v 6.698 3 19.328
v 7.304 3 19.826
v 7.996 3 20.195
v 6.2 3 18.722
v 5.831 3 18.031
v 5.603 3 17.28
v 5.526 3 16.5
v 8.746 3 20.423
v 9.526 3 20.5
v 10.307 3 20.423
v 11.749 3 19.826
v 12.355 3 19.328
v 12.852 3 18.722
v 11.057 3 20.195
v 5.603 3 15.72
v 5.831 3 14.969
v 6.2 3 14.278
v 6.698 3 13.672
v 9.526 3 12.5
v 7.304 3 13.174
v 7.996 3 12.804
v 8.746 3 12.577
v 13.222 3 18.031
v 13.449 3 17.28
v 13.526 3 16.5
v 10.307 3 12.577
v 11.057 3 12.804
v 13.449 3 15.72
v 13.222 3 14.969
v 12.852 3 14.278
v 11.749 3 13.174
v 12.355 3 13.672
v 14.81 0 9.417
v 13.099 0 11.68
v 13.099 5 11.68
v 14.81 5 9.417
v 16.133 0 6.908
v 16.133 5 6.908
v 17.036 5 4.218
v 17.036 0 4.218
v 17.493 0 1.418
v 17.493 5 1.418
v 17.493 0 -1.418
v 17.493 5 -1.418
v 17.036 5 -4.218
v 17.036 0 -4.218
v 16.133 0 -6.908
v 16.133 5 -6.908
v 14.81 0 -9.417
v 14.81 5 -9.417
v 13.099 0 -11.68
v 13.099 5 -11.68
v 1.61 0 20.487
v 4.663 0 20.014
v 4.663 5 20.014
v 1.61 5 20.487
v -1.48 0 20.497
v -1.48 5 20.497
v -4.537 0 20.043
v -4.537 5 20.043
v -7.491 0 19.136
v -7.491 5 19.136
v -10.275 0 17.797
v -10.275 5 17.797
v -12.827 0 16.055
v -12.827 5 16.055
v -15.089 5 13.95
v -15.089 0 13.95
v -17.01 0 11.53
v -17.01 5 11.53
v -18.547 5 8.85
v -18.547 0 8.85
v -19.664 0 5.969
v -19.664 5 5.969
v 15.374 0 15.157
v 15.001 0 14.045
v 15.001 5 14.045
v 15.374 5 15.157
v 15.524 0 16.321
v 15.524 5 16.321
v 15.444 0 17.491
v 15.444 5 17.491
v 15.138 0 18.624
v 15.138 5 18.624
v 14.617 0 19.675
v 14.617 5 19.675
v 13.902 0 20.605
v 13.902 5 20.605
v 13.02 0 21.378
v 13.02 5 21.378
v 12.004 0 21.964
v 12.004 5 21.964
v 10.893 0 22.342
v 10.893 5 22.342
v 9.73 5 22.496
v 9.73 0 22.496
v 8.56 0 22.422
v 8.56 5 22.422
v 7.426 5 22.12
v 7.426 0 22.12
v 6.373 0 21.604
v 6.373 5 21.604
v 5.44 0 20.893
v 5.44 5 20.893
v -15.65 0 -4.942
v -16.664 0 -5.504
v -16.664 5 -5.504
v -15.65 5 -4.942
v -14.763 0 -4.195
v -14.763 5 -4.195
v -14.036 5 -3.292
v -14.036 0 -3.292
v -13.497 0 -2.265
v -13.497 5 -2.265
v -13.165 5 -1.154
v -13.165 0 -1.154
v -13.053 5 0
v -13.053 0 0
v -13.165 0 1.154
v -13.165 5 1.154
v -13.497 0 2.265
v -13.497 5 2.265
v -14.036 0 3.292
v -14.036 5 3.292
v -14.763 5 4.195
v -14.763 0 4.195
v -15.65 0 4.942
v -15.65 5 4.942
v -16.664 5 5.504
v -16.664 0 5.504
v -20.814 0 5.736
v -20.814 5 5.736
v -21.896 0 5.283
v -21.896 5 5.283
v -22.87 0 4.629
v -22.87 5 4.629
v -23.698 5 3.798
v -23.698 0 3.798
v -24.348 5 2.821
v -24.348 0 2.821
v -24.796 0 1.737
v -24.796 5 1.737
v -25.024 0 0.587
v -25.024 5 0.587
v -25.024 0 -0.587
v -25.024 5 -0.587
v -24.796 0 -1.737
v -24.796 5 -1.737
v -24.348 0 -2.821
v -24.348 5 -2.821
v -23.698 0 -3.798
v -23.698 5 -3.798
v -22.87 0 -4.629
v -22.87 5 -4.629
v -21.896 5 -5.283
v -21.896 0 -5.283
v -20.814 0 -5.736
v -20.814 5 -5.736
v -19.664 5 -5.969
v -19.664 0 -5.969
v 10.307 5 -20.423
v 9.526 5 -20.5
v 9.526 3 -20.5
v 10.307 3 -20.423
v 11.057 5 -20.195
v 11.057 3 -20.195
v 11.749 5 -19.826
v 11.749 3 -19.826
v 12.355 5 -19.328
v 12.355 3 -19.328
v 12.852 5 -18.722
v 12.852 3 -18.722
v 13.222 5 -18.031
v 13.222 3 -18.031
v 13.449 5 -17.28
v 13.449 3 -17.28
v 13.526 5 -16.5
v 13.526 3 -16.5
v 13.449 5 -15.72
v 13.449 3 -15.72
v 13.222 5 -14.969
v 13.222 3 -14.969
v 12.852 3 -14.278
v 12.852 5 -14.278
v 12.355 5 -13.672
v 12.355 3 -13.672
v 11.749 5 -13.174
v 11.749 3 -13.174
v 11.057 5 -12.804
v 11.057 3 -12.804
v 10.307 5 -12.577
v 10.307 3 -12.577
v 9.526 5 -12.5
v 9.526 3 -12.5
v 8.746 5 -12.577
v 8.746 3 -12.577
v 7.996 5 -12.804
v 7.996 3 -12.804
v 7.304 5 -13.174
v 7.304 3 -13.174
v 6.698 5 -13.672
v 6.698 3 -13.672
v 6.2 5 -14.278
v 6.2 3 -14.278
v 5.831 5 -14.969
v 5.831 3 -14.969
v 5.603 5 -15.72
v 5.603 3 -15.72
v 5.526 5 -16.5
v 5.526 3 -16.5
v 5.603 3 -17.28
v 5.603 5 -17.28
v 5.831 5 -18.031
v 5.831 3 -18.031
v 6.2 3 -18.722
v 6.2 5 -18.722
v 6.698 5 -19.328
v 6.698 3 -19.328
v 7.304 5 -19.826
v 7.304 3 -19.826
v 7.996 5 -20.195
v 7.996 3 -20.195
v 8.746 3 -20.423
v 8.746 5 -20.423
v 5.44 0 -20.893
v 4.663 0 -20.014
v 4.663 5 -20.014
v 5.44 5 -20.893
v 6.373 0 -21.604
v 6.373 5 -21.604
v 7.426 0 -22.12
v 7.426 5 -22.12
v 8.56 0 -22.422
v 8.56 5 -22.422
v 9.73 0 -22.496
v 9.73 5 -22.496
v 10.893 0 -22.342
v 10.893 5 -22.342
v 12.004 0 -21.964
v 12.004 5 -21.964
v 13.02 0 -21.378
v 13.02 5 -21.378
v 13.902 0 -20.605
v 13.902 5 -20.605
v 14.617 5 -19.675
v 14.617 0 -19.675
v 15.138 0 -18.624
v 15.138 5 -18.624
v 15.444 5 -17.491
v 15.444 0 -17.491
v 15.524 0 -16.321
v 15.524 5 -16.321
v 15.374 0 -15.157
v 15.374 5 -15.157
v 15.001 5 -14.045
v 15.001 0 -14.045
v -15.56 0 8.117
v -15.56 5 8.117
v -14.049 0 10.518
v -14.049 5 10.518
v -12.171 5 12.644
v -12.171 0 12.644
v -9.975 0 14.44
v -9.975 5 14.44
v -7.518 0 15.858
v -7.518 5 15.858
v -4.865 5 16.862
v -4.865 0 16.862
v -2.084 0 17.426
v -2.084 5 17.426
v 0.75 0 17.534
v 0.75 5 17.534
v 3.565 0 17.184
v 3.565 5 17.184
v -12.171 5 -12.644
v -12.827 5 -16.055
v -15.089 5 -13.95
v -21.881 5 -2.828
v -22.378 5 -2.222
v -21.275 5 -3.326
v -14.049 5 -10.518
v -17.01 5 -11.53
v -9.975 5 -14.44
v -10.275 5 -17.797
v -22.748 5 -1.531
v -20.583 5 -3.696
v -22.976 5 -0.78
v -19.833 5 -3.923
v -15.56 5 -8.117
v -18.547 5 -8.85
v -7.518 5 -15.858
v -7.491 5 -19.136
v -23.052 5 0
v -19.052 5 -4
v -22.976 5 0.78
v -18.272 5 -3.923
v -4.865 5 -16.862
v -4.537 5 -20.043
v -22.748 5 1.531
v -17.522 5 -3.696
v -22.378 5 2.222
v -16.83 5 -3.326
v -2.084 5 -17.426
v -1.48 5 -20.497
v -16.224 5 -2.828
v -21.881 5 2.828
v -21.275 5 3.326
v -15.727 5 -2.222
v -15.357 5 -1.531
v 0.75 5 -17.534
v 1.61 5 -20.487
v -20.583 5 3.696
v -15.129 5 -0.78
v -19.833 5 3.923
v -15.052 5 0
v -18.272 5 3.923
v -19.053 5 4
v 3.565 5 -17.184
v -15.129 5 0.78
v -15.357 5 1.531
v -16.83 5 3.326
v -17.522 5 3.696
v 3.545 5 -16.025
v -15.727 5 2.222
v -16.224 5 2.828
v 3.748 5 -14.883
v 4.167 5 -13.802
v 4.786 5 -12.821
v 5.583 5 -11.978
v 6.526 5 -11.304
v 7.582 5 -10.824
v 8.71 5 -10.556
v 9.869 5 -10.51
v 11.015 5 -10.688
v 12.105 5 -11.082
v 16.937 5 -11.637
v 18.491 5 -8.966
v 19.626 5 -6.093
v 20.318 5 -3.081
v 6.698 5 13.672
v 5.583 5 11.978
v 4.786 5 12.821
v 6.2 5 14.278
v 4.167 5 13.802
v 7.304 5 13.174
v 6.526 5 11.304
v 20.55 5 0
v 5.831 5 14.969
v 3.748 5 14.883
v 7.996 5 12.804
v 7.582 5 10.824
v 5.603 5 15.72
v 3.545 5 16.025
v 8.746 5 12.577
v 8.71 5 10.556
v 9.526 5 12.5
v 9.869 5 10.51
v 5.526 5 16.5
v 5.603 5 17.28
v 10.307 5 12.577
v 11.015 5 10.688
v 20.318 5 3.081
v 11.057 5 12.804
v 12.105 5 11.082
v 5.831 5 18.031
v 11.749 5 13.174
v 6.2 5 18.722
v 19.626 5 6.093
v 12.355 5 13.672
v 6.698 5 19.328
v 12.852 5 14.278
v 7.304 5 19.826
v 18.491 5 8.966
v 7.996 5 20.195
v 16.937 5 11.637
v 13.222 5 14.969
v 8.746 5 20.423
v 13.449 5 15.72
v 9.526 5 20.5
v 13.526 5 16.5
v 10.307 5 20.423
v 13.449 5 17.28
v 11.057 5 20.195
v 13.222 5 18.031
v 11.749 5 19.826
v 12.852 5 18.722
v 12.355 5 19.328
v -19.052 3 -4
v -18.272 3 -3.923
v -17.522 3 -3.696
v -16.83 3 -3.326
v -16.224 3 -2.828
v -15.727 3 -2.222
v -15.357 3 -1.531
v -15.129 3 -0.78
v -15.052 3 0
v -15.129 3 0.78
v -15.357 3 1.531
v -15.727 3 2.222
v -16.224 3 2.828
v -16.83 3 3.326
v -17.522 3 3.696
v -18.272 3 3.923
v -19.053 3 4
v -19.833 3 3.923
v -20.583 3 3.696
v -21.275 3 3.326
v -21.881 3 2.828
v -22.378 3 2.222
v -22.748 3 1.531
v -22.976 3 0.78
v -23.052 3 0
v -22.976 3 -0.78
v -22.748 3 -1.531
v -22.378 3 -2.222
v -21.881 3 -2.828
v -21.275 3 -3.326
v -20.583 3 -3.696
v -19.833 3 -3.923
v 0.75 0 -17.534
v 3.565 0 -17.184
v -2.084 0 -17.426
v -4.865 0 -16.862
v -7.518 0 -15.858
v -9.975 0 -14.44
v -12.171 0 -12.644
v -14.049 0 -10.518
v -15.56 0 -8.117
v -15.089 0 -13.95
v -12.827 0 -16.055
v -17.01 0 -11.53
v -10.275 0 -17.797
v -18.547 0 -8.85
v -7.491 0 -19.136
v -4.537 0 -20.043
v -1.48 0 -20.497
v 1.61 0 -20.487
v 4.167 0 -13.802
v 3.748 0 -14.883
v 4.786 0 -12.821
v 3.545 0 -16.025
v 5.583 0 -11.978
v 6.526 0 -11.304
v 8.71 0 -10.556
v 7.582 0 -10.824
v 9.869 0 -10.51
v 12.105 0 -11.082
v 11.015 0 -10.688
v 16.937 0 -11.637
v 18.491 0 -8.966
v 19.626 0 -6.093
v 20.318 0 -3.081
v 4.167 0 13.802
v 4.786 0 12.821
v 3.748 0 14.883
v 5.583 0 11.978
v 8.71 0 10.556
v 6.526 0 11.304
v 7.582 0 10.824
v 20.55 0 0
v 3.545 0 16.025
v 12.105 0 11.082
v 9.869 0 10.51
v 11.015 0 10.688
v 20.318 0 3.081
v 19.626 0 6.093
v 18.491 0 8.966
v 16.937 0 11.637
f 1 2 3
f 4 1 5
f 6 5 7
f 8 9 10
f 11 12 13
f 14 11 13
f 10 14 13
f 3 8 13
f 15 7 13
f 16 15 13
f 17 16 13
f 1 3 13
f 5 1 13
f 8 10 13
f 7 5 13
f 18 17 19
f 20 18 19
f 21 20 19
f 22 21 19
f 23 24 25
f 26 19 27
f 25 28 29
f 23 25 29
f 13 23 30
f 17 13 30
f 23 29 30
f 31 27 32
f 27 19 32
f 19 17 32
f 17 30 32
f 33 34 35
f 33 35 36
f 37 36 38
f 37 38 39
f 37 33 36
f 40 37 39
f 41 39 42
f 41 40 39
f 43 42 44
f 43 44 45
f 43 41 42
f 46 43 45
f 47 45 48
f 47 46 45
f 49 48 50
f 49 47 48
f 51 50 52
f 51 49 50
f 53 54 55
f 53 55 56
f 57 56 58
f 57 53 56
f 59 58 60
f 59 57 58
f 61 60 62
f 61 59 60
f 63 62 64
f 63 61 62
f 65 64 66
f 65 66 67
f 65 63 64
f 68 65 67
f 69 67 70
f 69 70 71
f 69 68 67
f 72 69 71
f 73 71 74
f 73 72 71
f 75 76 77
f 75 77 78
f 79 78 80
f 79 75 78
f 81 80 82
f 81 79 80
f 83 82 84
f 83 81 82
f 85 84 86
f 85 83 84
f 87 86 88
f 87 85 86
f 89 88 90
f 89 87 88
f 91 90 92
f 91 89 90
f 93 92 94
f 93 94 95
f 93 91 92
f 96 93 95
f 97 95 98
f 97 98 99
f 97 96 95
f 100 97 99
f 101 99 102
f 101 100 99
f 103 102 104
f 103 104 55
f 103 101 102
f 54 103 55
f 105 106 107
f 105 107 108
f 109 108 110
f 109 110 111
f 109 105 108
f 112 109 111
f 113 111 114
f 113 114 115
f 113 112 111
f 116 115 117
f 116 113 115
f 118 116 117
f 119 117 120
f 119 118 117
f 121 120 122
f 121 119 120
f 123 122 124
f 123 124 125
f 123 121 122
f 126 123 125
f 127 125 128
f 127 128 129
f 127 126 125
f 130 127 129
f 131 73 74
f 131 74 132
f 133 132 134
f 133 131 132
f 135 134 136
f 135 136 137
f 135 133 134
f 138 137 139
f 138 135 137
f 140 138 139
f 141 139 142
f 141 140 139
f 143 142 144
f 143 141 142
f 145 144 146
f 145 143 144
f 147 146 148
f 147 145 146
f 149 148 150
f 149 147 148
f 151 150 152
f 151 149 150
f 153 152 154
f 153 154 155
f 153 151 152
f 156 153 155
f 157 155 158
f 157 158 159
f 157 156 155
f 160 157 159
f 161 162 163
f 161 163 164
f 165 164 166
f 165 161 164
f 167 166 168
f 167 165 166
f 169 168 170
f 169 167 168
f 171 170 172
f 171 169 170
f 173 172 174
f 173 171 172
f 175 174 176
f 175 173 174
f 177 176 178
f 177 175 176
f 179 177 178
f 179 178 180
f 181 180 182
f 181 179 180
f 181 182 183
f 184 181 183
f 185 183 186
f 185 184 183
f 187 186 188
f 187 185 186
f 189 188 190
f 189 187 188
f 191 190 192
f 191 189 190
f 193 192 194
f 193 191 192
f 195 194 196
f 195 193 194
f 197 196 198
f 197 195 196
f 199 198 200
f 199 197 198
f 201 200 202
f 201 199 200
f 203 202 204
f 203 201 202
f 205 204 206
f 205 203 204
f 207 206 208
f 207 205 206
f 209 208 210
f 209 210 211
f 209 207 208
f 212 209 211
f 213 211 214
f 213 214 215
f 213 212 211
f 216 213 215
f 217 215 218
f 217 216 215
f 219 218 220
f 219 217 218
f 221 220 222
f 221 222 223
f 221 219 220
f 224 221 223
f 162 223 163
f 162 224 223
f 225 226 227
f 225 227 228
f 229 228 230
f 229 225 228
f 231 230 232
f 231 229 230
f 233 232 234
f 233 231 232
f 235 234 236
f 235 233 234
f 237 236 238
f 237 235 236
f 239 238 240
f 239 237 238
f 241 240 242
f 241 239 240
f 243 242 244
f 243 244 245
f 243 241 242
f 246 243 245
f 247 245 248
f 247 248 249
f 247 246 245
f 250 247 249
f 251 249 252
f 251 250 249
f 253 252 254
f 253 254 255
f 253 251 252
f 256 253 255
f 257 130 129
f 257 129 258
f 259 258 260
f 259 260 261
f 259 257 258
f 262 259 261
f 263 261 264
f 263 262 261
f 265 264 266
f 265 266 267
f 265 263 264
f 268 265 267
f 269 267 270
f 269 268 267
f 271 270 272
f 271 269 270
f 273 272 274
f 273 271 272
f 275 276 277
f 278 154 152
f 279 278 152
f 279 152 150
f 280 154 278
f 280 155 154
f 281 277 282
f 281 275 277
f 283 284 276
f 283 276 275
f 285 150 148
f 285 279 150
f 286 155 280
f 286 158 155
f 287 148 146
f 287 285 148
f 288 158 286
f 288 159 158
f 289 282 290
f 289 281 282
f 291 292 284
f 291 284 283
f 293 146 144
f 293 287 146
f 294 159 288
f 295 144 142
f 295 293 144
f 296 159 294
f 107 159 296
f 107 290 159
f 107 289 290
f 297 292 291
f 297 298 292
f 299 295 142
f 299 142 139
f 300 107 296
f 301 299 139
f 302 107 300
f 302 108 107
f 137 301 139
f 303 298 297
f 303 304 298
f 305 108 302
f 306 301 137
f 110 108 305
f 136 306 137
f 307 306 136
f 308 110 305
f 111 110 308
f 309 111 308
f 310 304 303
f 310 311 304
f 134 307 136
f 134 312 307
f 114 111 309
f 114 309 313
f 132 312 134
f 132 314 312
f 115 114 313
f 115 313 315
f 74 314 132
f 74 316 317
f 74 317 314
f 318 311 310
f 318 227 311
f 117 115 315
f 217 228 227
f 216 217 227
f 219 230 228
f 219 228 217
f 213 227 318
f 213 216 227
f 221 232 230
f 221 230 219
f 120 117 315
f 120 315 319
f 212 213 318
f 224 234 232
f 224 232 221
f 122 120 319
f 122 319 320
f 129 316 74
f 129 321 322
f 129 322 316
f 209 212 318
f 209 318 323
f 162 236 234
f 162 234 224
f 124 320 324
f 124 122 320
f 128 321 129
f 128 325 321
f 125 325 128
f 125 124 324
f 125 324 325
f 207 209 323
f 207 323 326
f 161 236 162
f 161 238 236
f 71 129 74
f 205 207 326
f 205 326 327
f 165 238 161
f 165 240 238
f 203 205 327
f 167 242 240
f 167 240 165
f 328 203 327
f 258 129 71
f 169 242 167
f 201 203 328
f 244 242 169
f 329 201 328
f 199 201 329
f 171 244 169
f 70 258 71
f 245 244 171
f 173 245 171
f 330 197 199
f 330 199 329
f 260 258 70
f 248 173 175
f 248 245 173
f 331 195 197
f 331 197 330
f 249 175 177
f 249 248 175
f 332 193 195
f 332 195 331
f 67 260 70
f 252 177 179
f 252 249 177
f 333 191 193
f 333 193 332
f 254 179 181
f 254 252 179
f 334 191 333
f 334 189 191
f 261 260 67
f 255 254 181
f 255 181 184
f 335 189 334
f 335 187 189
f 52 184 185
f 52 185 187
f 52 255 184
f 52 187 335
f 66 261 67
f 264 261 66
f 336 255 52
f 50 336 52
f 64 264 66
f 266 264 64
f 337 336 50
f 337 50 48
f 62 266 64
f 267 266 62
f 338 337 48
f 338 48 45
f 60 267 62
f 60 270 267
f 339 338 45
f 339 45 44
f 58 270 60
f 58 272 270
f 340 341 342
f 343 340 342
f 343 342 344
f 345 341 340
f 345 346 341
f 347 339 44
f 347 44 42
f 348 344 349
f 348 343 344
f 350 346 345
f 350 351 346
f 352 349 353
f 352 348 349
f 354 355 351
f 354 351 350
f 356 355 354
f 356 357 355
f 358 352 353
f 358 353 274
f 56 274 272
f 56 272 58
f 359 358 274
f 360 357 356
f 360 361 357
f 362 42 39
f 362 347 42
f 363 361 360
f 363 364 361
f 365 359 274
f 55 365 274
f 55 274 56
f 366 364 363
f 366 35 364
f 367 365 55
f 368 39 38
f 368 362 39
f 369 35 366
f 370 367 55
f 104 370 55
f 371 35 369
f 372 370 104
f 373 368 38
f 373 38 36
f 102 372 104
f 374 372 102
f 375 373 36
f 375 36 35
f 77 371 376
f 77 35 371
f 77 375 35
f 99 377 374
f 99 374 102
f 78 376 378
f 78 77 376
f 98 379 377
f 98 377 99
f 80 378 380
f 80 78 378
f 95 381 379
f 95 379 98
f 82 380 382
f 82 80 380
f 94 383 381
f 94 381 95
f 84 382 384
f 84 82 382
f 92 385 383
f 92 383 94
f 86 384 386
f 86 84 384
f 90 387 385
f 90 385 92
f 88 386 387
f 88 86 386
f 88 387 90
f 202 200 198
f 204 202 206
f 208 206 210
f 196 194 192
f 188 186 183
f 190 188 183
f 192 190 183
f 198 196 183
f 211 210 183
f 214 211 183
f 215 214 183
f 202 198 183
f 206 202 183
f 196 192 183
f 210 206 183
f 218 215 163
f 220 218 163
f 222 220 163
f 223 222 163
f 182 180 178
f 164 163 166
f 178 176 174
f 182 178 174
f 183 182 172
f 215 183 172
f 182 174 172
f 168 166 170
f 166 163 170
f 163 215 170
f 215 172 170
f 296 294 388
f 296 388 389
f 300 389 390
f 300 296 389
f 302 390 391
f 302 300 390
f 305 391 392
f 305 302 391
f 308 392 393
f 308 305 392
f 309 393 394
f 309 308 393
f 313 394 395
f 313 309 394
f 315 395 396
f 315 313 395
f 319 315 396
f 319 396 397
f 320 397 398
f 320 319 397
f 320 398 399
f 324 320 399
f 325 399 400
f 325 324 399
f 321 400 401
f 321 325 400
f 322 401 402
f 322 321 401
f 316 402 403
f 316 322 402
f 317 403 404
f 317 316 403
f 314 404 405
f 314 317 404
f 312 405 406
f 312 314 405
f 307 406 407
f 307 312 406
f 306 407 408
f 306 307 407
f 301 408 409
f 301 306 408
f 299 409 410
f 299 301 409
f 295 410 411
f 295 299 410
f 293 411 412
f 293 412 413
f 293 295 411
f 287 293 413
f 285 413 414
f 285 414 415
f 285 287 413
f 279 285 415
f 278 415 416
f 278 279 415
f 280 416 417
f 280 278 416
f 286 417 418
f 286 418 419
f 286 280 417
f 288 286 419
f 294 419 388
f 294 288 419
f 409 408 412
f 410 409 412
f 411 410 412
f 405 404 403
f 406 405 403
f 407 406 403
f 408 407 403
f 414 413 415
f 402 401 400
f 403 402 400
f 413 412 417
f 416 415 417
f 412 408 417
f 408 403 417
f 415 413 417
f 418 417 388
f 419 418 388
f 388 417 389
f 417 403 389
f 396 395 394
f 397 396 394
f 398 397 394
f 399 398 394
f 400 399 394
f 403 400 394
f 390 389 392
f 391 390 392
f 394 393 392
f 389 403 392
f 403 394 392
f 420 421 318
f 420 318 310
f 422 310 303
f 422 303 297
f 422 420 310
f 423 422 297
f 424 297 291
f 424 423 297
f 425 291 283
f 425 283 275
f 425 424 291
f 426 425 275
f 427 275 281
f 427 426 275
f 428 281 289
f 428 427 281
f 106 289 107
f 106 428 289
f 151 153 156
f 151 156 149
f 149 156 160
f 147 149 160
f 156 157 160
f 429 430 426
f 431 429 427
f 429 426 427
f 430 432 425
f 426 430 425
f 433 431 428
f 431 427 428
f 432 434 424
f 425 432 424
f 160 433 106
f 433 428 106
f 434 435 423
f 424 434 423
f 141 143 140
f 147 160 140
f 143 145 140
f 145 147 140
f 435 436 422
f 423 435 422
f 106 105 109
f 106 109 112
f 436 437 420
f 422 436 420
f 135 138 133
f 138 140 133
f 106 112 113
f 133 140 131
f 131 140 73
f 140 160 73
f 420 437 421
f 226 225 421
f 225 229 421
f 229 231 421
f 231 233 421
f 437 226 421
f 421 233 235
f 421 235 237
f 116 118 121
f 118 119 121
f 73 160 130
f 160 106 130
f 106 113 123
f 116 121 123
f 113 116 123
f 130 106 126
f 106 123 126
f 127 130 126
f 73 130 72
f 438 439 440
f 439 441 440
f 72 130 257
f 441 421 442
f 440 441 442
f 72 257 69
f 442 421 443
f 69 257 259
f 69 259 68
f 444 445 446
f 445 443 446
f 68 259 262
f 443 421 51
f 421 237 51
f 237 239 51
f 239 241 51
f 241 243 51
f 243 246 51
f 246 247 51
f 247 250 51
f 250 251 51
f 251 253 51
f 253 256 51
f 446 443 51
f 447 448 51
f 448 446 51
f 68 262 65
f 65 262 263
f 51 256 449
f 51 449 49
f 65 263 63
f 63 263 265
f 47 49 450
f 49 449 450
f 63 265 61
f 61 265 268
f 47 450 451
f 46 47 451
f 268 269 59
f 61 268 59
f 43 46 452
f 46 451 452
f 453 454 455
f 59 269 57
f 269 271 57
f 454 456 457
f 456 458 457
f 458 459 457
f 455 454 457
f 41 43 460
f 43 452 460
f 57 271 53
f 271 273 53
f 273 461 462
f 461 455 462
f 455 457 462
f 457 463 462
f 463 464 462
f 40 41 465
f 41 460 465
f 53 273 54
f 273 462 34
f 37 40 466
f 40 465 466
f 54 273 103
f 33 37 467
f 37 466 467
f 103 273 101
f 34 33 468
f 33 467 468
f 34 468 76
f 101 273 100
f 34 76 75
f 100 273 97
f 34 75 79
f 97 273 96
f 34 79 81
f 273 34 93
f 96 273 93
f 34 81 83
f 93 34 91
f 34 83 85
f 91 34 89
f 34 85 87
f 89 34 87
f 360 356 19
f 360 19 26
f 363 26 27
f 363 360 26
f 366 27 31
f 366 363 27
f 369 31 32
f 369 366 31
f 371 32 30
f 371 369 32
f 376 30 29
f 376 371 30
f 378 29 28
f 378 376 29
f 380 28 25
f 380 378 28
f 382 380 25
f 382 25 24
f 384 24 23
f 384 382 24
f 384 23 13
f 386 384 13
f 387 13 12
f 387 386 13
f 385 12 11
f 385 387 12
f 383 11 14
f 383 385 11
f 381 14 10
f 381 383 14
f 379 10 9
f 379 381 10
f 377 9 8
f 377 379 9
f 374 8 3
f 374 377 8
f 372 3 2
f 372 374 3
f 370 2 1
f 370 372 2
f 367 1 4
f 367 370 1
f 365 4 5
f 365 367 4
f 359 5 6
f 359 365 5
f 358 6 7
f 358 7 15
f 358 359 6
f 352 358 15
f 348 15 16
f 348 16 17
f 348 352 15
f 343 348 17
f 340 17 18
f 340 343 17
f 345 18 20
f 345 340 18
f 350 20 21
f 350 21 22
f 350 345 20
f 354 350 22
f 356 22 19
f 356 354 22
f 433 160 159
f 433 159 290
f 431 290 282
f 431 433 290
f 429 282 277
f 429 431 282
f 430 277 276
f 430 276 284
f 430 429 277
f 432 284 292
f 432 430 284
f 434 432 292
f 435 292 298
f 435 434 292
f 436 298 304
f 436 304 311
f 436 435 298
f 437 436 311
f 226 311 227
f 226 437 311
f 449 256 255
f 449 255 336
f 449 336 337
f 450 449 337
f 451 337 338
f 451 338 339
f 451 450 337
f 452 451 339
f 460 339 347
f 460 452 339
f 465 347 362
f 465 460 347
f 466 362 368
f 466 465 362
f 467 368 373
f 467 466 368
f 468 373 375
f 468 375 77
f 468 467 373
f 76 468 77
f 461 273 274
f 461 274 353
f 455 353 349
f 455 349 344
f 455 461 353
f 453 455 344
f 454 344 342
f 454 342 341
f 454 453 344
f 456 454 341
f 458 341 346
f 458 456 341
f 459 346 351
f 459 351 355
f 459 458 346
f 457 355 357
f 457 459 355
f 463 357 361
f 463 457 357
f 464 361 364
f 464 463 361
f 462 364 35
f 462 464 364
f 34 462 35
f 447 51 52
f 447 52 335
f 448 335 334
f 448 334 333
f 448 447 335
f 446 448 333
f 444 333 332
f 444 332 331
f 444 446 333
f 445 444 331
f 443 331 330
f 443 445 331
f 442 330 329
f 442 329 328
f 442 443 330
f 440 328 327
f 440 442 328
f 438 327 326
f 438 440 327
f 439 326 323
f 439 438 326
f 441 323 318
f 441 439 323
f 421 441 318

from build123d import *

# Parameters (mm, degrees)
SKETCH2_R           = 26
BOSS_EXTRUDE2_DEPTH = 5
SKETCH3_R           = 4
CUT_EXTRUDE1_DEPTH  = 2
SKETCH5_R           = 26
CUT_EXTRUDE3_DEPTH  = 38.107950631


with BuildPart() as part:
    # Sketch2 → Boss-Extrude2 (new body)
    with BuildSketch(Plane(origin=(0, 0, 0), x_dir=(1, 0, 0), z_dir=(0, 1, 0))):
        Circle(SKETCH2_R)
    extrude(amount=BOSS_EXTRUDE2_DEPTH)

    # Sketch3 → Cut-Extrude1 (cut)
    with BuildSketch(Plane.XZ.offset(-5)):
        with Locations((9.52625, -16.499949006)):
            Circle(SKETCH3_R)
        with Locations((9.52625, 16.499949006)):
            Circle(SKETCH3_R)
        with Locations((-19.0525, 0)):
            Circle(SKETCH3_R)
    extrude(amount=CUT_EXTRUDE1_DEPTH, mode=Mode.SUBTRACT)

    # Sketch5 → Cut-Extrude3 (cut, through all)
    # profile 1 of 2: a face of its own
    with BuildSketch(Plane(origin=(0, 5, 0), x_dir=(1, 0, 0), z_dir=(0, 1, 0))):
        Circle(SKETCH5_R)
        with BuildLine():
            ThreePointArc((-19.664092803, 5.96874813), (-10.275, 17.796822048), (4.662958892, 20.013977975))
            ThreePointArc((4.662958892, 20.013977975), (12.52625, 21.696101428), (15.001133911, 14.045229844))
            ThreePointArc((15.001133911, 14.045229844), (20.55, 0), (15.001133911, -14.045229844))
            ThreePointArc((15.001133911, -14.045229844), (12.52625, -21.696101428), (4.662958892, -20.013977975))
            ThreePointArc((4.662958892, -20.013977975), (-10.275, -17.796822048), (-19.664092803, -5.96874813))
            ThreePointArc((-19.664092803, -5.96874813), (-25.0525, 0), (-19.664092803, 5.96874813))
        make_face(mode=Mode.SUBTRACT)
    # profile 2 of 2: a face of its own
    with BuildSketch(Plane(origin=(0, 5, 0), x_dir=(1, 0, 0), z_dir=(0, 1, 0))):
        with BuildLine():
            ThreePointArc((13.099112583, 11.679715302), (6.52625, 11.303796583), (3.565373869, 17.184021915))
            ThreePointArc((3.565373869, 17.184021915), (-8.775, 15.198745836), (-16.664486452, 5.504306613))
            ThreePointArc((-16.664486452, 5.504306613), (-13.0525, 0), (-16.664486452, -5.504306613))
            ThreePointArc((-16.664486452, -5.504306613), (-8.775, -15.198745836), (3.565373869, -17.184021915))
            ThreePointArc((3.565373869, -17.184021915), (6.52625, -11.303796583), (13.099112583, -11.679715302))
            ThreePointArc((13.099112583, -11.679715302), (17.55, 0), (13.099112583, 11.679715302))
        make_face()
    extrude(amount=-CUT_EXTRUDE3_DEPTH, mode=Mode.SUBTRACT)


solid = part.part
